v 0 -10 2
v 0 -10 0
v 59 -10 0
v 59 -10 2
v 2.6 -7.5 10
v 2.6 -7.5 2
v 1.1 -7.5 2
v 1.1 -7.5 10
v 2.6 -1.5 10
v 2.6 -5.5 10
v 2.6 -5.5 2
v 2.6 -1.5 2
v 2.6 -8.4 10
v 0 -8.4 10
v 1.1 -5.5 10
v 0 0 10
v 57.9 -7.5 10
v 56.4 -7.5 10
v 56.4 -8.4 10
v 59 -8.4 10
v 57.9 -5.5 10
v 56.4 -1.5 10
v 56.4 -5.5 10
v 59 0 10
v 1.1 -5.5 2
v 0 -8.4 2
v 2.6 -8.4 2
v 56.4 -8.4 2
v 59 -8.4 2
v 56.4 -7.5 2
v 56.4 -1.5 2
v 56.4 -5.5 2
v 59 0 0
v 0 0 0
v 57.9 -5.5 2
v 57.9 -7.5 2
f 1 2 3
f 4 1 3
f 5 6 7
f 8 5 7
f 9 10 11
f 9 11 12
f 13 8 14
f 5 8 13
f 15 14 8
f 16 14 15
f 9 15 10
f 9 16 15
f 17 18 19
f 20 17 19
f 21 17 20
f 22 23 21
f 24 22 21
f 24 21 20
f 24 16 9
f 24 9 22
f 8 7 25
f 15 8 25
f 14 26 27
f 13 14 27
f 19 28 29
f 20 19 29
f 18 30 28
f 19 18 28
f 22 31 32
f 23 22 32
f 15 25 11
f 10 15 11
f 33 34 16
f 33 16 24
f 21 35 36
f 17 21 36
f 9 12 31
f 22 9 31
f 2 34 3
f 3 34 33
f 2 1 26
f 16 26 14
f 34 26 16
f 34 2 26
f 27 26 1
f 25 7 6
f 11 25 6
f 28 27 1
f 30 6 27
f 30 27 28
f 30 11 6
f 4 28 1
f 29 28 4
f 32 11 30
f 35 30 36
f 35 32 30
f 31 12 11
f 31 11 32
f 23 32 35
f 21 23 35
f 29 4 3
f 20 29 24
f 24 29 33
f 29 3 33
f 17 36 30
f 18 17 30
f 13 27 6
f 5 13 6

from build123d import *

# Parameters (mm, degrees)
PAD001_DEPTH = 10
SKETCH_W     = 59
SKETCH_H     = 10
PAD_DEPTH    = 2


with BuildPart() as pad001:
    # Sketch001 → Pad001 (new body)
    with BuildSketch(Plane.XY):
        Polygon((0, 0), (0, -8.4), (2.6, -8.4), (2.6, -7.5), (1.1, -7.5), (1.1, -5.5), (2.6, -5.5), (2.6, -1.5), (56.4, -1.5), (56.4, -5.5), (57.9, -5.5), (57.9, -7.5), (56.4, -7.5), (56.4, -8.4), (59, -8.4), (59, 0), align=None)
    extrude(amount=PAD001_DEPTH)


with BuildPart() as fusion:
    # Sketch → Pad (new body)
    with BuildSketch(Plane.XY):
        with Locations((29.5, -5)):
            Rectangle(SKETCH_W, SKETCH_H)
    extrude(amount=PAD_DEPTH)

    # Fusion: union Pad001
    add(pad001.part)


solid = fusion.part
